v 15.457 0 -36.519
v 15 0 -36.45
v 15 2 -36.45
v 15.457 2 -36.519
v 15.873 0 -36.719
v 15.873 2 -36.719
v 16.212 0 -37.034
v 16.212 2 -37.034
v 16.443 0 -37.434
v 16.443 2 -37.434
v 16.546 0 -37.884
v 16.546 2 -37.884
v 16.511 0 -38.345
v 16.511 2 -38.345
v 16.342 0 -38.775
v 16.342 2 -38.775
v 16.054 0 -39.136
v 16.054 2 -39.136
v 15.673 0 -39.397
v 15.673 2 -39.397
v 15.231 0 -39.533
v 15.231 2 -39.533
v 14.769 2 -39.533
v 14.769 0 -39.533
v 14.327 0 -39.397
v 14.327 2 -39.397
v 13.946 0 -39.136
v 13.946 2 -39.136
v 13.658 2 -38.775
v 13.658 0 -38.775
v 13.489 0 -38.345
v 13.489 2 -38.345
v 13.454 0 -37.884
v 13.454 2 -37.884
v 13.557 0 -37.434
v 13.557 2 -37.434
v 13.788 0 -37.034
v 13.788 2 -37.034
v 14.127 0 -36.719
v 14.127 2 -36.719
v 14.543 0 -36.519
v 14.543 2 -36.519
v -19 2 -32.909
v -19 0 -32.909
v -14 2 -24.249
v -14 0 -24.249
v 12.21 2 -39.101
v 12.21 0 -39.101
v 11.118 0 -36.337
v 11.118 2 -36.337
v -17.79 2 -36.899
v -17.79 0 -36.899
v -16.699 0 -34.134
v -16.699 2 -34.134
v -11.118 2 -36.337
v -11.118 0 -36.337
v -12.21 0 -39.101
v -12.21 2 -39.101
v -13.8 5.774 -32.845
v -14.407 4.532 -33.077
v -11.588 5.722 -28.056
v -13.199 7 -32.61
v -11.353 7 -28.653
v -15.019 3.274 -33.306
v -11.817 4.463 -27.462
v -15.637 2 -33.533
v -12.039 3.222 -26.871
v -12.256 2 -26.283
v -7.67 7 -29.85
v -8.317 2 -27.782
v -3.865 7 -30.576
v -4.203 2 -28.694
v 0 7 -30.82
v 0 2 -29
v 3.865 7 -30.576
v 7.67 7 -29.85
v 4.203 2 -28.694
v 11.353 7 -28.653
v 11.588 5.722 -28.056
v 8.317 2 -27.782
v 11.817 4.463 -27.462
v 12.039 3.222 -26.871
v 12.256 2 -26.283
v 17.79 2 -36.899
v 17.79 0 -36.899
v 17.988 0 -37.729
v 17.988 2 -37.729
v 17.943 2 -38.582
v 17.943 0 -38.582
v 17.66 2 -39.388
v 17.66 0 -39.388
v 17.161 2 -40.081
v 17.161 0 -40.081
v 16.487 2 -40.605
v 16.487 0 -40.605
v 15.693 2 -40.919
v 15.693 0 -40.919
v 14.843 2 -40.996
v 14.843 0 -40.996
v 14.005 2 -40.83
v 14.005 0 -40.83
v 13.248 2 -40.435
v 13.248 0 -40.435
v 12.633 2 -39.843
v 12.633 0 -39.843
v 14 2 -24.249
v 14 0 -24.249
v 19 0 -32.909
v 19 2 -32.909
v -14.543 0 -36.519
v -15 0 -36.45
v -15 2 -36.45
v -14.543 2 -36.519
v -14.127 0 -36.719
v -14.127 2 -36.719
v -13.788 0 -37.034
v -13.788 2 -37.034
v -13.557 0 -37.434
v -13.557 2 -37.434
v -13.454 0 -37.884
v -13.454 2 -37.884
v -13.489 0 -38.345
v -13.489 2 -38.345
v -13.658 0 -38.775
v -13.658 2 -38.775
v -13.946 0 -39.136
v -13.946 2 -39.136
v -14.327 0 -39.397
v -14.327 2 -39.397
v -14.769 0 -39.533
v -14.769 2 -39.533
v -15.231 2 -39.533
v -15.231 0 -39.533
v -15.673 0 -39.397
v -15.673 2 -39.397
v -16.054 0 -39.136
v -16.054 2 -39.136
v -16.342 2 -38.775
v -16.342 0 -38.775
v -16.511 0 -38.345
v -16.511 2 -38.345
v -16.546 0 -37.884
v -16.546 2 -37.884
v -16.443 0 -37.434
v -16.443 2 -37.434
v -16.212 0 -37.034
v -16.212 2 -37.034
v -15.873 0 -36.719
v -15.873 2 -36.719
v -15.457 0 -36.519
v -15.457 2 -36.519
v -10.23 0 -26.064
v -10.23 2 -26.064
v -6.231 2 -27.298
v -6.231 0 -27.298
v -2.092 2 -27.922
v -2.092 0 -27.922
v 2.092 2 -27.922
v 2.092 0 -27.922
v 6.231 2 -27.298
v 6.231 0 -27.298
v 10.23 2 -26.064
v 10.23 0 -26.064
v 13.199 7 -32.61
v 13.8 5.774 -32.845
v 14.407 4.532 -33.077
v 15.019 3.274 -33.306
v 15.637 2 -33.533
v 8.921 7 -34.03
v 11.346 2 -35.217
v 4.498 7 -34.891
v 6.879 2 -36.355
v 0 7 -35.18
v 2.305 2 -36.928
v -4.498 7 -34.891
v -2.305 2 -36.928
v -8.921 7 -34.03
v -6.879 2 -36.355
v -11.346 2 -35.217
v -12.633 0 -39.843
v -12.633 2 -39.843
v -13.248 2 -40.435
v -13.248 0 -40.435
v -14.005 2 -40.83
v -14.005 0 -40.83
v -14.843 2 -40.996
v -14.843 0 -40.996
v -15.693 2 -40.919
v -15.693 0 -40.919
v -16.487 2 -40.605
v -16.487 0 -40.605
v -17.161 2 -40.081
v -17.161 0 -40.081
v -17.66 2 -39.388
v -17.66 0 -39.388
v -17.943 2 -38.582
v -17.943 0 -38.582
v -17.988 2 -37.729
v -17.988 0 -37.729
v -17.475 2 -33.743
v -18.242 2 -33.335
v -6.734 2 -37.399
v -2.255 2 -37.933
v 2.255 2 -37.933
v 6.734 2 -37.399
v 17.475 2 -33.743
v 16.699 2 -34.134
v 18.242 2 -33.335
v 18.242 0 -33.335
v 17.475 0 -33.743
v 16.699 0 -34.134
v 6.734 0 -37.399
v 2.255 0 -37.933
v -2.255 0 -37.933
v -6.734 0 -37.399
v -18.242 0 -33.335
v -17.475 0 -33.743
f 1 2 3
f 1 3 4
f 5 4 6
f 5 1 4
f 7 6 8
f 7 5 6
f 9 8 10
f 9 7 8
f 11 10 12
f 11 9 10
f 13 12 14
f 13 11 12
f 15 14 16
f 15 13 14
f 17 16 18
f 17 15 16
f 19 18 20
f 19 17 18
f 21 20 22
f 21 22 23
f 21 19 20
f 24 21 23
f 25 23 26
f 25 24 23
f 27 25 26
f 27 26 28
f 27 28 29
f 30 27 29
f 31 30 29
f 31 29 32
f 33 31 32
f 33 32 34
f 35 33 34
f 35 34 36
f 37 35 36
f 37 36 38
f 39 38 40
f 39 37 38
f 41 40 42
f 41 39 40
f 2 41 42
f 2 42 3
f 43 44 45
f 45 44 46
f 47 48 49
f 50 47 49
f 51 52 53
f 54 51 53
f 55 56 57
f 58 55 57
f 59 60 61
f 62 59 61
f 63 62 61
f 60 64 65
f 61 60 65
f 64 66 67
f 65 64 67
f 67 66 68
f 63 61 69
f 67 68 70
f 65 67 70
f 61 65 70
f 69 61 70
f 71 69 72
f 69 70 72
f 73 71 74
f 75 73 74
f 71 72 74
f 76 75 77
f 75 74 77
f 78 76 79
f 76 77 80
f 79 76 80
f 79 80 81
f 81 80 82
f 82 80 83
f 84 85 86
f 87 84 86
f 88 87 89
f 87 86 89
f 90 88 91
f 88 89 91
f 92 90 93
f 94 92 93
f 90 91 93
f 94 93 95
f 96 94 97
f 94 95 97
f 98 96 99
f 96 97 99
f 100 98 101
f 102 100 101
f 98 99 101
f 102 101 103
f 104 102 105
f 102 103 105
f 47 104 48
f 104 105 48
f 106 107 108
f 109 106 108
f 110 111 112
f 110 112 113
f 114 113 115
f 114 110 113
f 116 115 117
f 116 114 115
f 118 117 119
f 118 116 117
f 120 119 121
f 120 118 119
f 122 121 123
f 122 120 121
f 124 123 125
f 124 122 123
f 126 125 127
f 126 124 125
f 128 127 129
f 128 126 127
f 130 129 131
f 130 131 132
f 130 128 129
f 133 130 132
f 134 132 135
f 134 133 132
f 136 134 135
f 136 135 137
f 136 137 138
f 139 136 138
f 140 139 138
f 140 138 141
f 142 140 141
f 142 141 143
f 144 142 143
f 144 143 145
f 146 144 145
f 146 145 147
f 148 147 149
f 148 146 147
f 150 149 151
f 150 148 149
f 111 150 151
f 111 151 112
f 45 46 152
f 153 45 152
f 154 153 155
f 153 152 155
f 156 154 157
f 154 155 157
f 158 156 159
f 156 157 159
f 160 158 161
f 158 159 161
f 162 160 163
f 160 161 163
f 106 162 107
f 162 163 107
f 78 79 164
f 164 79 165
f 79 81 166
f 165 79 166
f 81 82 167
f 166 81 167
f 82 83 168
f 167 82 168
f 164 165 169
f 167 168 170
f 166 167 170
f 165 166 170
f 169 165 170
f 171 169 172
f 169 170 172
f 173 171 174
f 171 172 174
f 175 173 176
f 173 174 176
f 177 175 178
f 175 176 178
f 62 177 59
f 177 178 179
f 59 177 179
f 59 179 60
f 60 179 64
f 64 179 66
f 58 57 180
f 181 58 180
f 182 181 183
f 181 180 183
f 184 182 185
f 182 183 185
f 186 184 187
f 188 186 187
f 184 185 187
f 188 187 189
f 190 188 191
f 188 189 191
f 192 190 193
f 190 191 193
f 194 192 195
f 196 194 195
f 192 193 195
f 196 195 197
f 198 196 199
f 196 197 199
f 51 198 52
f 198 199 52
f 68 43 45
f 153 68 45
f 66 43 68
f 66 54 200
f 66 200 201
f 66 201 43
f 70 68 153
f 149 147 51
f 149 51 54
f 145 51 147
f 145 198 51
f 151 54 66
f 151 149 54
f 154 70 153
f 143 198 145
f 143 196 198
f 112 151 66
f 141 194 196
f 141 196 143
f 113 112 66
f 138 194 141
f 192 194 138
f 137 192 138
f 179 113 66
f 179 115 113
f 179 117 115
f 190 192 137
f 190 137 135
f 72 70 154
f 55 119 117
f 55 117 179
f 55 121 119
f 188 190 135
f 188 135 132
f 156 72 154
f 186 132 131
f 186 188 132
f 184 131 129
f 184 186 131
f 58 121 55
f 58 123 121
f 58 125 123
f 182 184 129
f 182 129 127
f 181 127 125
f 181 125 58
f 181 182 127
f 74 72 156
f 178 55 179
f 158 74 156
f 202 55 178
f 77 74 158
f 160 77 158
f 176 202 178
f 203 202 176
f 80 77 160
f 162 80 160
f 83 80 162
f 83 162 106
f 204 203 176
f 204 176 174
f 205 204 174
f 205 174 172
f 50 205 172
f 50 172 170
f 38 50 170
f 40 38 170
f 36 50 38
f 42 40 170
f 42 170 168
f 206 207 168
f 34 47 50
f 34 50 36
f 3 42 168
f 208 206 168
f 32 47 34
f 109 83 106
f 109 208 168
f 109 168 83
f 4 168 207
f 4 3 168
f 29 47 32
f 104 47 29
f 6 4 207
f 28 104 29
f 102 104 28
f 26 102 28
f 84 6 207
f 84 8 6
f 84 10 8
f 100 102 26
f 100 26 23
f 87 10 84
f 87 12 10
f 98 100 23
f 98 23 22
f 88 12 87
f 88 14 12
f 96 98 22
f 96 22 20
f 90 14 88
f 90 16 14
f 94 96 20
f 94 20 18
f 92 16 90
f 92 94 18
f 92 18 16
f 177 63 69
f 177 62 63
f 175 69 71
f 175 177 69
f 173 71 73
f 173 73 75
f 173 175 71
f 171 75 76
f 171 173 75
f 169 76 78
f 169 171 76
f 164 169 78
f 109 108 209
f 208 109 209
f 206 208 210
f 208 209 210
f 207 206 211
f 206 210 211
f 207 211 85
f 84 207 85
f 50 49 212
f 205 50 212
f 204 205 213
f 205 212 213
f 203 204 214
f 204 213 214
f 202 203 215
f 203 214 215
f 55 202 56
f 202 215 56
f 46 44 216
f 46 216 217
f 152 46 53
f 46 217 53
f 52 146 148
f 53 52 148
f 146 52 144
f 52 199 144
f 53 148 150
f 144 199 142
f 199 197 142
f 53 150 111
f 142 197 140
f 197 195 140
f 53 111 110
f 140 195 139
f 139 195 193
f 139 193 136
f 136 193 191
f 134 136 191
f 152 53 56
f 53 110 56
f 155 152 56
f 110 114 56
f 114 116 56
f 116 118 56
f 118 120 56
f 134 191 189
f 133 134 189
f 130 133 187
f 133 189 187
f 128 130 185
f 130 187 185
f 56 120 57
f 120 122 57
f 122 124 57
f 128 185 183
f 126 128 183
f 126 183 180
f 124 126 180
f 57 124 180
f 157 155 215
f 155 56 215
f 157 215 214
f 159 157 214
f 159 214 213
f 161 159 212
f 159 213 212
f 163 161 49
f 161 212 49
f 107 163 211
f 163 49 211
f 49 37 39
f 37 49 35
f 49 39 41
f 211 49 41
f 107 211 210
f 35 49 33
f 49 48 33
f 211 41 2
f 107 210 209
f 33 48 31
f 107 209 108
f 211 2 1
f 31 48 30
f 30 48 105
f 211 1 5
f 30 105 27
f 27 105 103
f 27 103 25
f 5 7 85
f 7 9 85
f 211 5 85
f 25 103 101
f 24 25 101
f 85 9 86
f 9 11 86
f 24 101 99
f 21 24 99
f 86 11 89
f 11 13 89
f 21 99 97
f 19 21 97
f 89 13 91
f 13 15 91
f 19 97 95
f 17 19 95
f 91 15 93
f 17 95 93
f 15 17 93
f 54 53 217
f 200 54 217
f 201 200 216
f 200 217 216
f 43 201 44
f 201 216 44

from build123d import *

# Parameters (mm, degrees)
SKETCH1_R           = 1.55
BOSS_EXTRUDE1_DEPTH = 2
BOSS_EXTRUDE2_DEPTH = 5
BOSS_EXTRUDE2_DRAFT = 20


with BuildPart() as part:
    # Sketch1 → Boss-Extrude1 (new body)
    with BuildSketch(Plane(origin=(0, 0, 0), x_dir=(1, 0, 0), z_dir=(0, 1, 0))):
        with BuildLine():
            Line((14, 24.248711306), (19, 32.908965344))
            ThreePointArc((19, 32.908965344), (17.860130505, 33.541254275), (16.699245775, 34.134076676))
            Line((16.699245775, 34.134076676), (17.790465664, 36.898500396))
            ThreePointArc((17.790465664, 36.898500396), (16.101499604, 40.790465664), (12.209534336, 39.101499604))
            Line((12.209534336, 39.101499604), (11.118314447, 36.337075885))
            ThreePointArc((11.118314447, 36.337075885), (0, 38), (-11.118314447, 36.337075885))
            Line((-11.118314447, 36.337075885), (-12.209534336, 39.101499604))
            ThreePointArc((-12.209534336, 39.101499604), (-16.101499604, 40.790465664), (-17.790465664, 36.898500396))
            Line((-17.790465664, 36.898500396), (-16.699245775, 34.134076676))
            ThreePointArc((-16.699245775, 34.134076676), (-17.860130505, 33.541254275), (-19, 32.908965344))
            Line((-19, 32.908965344), (-14, 24.248711306))
            ThreePointArc((-14, 24.248711306), (0, 28), (14, 24.248711306))
        make_face()
        with Locations(Location((-15, 38, 0), (0, 0, 270))):
            Circle(SKETCH1_R, mode=Mode.SUBTRACT)
        with Locations(Location((15, 38, 0), (0, 0, 270))):
            Circle(SKETCH1_R, mode=Mode.SUBTRACT)
    extrude(amount=BOSS_EXTRUDE1_DEPTH)


with BuildPart() as boss_extrude2_tool:
    # Sketch2 → Boss-Extrude2 (with draft: the straight prism first)
    with BuildSketch(Plane(origin=(0, 2, 0), x_dir=(1, 0, 0), z_dir=(0, 1, 0))):
        with BuildLine():
            ThreePointArc((-12.25592959, 26.282925824), (0, 29), (12.25592959, 26.282925824))
            Line((12.25592959, 26.282925824), (15.636875684, 33.53338812))
            ThreePointArc((15.636875684, 33.53338812), (0, 37), (-15.636875684, 33.53338812))
            Line((-15.636875684, 33.53338812), (-12.25592959, 26.282925824))
        make_face()
    extrude(amount=BOSS_EXTRUDE2_DEPTH)
    # Boss-Extrude2: the draft: its side faces are tilted about the plane it starts from
    boss_extrude2_sides = [boss_extrude2_tool.faces().sort_by_distance(p)[0] for p in [
        (0, 4.5, -29),
        (13.946402637, 4.5, -29.908156972),
        (0, 4.5, -37),
        (-13.946402637, 4.5, -29.908156972),
    ]]
    draft(boss_extrude2_sides, Plane(origin=(0, 2, 0), x_dir=(1, 0, 0), z_dir=(0, 1, 0)), BOSS_EXTRUDE2_DRAFT)


with BuildPart() as part_1:
    add(part.part)

    # Boss-Extrude2: add boss_extrude2_tool
    add(boss_extrude2_tool.part)


solid = part_1.part
